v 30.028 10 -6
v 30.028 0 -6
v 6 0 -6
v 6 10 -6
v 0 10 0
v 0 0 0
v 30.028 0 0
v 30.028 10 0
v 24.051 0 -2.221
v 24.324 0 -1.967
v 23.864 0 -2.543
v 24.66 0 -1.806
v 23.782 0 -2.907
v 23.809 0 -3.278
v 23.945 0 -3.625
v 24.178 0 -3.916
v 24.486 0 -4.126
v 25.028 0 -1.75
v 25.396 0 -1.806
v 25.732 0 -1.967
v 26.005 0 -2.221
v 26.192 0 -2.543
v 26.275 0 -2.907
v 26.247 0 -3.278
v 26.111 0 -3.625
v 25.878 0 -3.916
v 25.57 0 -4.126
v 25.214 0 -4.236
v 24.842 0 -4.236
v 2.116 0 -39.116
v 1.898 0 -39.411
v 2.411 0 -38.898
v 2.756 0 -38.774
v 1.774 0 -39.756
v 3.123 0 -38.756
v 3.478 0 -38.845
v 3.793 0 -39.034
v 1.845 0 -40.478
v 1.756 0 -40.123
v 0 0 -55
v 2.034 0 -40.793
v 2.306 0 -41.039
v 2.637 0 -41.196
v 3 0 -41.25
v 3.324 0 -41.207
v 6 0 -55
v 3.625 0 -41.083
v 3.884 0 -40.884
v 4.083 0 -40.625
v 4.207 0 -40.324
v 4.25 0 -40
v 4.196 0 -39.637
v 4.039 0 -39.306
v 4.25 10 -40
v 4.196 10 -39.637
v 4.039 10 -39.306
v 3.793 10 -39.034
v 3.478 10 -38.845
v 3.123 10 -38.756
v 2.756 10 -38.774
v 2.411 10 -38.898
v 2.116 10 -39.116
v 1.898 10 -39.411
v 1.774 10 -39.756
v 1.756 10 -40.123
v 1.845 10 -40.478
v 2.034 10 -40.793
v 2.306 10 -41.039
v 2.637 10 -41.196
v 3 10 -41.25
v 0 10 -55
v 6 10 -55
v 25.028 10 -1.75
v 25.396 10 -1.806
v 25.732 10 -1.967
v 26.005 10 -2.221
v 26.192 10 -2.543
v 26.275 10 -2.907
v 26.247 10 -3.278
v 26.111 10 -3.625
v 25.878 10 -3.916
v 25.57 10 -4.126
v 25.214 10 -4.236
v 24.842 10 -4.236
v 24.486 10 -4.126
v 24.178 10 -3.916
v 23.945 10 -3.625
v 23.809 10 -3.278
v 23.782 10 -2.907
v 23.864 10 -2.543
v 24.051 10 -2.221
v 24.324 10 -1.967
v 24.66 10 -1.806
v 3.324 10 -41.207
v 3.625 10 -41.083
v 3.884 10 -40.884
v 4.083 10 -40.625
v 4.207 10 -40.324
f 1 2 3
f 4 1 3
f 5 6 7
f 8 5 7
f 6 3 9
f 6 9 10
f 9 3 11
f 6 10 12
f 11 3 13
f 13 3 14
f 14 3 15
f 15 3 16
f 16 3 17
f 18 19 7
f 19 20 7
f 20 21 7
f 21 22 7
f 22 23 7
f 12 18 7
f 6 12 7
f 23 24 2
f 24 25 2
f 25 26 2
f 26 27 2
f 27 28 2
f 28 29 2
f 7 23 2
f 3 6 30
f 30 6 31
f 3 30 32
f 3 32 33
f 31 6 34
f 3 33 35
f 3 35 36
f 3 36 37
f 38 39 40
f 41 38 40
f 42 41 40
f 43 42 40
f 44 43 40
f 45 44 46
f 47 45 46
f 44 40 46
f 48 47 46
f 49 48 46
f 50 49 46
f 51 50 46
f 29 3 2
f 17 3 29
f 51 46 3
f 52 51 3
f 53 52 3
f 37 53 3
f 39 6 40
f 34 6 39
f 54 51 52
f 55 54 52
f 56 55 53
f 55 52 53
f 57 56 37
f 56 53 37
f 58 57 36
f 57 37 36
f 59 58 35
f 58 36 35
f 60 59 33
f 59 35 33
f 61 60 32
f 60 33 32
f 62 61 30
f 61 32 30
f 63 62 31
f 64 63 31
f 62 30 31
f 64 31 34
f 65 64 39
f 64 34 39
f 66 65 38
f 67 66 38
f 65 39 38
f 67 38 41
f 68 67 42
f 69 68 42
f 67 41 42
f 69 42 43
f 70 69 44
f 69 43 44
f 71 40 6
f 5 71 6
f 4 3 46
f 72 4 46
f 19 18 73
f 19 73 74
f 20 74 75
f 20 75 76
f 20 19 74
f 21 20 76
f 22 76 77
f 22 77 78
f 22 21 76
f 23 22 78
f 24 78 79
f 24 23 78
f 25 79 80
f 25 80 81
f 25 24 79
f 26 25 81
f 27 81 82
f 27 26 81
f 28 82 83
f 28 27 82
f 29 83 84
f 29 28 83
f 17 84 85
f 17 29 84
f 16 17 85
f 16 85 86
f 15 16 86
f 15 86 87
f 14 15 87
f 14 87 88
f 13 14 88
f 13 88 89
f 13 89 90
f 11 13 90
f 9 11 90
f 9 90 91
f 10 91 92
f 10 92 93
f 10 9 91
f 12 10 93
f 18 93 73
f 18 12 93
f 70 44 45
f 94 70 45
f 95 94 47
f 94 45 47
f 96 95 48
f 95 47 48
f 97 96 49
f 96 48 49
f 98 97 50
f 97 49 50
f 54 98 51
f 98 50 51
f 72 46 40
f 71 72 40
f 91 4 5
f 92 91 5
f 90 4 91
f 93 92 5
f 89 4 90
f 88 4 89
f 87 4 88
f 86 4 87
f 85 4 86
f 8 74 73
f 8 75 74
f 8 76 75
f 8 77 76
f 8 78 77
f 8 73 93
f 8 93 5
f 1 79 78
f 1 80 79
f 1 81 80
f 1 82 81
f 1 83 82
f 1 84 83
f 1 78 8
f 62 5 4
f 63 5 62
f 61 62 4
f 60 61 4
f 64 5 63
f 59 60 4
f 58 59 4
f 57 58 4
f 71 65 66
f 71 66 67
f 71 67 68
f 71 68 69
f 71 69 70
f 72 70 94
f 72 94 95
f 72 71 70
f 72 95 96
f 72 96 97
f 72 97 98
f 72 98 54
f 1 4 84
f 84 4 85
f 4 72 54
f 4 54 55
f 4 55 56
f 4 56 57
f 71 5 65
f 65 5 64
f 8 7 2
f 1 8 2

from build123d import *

# Parameters (mm, degrees)
SKETCH1_R           = 1.25
BOSS_EXTRUDE1_DEPTH = 10


with BuildPart() as part:
    # Sketch1 → Boss-Extrude1 (new body)
    # profile 1 of 2: a face of its own
    with BuildSketch(Plane(origin=(0, 0, 0), x_dir=(1, 0, 0), z_dir=(0, 1, 0))):
        Polygon((6, 55), (3, 55), (0, 55), (0, 0), (6, 0), (6, 6), align=None)
        with BuildLine():
            ThreePointArc((4.25, 40), (2.116116524, 39.116116524), (3, 41.25))
            ThreePointArc((3, 41.25), (3.883883476, 40.883883476), (4.25, 40))
        make_face(mode=Mode.SUBTRACT)
    # profile 2 of 2: a face of its own
    with BuildSketch(Plane(origin=(0, 0, 0), x_dir=(1, 0, 0), z_dir=(0, 1, 0))):
        Polygon((30.028010211, 6), (6, 6), (6, 0), (30.028010211, 0), (30.028010211, 3), align=None)
        with Locations(Location((25.028010211, 3, 0), (0, 0, 270))):
            Circle(SKETCH1_R, mode=Mode.SUBTRACT)
    extrude(amount=BOSS_EXTRUDE1_DEPTH)


solid = part.part
